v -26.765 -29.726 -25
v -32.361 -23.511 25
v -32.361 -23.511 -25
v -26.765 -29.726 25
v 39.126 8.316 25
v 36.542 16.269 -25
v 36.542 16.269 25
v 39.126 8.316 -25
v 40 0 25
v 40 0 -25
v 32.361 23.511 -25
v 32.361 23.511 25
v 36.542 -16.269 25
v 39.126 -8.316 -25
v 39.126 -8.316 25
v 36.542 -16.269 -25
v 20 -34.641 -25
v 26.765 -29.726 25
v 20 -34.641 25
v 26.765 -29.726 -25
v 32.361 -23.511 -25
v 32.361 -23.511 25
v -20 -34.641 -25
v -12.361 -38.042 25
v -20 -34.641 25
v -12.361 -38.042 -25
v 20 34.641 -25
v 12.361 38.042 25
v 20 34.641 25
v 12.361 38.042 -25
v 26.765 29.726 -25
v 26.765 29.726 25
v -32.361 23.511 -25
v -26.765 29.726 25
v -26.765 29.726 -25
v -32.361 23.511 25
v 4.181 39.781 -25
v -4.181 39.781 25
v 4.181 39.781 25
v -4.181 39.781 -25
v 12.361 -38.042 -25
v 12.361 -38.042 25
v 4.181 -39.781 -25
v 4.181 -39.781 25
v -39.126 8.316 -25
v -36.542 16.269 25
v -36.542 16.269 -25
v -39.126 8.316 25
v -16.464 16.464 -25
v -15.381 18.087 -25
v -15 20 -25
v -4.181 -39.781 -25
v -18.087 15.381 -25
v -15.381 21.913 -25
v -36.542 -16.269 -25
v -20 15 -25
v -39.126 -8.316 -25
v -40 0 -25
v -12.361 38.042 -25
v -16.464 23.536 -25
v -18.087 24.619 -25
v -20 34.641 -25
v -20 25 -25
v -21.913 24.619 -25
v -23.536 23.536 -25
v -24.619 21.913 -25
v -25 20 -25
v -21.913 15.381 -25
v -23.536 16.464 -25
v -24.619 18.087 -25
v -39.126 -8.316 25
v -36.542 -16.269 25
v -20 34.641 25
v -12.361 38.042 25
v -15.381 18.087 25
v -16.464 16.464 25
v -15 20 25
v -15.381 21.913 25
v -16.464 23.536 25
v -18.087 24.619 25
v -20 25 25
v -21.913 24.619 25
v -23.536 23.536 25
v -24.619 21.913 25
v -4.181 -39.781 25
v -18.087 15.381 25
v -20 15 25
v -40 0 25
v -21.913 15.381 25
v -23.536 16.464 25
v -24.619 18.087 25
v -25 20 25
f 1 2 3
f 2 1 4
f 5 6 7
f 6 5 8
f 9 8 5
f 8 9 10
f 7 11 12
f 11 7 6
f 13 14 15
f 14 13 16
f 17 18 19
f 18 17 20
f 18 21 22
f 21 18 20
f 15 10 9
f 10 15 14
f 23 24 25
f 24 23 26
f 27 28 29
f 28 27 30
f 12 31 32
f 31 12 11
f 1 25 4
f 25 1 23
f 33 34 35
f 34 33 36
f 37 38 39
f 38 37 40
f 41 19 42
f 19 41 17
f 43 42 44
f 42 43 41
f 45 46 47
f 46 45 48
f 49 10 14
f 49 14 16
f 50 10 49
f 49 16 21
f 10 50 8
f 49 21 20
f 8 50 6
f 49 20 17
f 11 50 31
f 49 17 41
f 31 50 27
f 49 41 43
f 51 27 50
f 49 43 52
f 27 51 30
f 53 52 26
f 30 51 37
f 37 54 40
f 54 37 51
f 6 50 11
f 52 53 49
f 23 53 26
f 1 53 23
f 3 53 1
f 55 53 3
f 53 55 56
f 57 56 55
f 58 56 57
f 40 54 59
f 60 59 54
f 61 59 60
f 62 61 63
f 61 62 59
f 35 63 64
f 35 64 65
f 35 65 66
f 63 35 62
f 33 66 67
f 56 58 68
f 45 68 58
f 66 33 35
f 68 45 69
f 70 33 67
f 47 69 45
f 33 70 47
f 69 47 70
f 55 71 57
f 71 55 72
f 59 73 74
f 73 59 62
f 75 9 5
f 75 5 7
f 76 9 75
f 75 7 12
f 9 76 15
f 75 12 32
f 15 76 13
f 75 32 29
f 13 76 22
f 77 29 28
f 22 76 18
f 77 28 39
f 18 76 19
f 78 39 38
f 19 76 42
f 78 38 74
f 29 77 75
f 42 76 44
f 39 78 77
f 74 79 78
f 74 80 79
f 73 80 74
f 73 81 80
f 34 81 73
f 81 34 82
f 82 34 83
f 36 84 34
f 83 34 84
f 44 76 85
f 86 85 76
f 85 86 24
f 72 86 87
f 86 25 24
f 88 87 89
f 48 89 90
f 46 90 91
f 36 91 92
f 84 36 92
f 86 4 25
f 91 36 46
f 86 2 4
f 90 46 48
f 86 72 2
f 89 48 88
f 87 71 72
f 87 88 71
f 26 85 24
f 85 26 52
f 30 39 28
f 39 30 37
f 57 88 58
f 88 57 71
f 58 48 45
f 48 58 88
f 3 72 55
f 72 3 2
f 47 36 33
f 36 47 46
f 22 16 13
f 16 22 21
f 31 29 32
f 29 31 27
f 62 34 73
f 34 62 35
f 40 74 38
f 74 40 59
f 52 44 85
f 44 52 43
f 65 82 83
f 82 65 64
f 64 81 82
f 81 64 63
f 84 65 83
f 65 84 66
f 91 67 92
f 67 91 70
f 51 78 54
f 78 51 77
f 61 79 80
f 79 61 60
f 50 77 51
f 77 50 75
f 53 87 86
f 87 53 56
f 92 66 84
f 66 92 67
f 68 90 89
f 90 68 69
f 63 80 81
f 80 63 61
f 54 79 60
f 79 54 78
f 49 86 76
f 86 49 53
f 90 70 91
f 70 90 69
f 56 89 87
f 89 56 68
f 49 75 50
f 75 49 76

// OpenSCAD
// Coffee Mug in OpenSCAD

// Parameters
mug_height = 100;
mug_diameter = 80;
handle_height = 50;
handle_width = 25;
handle_depth = 20;
handle_radius = 5;
handle_offset_x = 20;
handle_offset_y = 20;

// Body
module coffee_mug_body() {
  cylinder(h = mug_height - handle_height, r = mug_diameter / 2, center = true);
}

// Handle
module coffee_mug_handle() {
  translate([handle_offset_x, handle_offset_y, 0]) {
    cylinder(h = handle_height, r = handle_radius, center = true);
  }
}

// Coffee Mug
module coffee_mug() {
  difference() {
    coffee_mug_body();
    rotate([0, 0, 90])
    coffee_mug_handle();
  }
}

// Render
coffee_mug();
